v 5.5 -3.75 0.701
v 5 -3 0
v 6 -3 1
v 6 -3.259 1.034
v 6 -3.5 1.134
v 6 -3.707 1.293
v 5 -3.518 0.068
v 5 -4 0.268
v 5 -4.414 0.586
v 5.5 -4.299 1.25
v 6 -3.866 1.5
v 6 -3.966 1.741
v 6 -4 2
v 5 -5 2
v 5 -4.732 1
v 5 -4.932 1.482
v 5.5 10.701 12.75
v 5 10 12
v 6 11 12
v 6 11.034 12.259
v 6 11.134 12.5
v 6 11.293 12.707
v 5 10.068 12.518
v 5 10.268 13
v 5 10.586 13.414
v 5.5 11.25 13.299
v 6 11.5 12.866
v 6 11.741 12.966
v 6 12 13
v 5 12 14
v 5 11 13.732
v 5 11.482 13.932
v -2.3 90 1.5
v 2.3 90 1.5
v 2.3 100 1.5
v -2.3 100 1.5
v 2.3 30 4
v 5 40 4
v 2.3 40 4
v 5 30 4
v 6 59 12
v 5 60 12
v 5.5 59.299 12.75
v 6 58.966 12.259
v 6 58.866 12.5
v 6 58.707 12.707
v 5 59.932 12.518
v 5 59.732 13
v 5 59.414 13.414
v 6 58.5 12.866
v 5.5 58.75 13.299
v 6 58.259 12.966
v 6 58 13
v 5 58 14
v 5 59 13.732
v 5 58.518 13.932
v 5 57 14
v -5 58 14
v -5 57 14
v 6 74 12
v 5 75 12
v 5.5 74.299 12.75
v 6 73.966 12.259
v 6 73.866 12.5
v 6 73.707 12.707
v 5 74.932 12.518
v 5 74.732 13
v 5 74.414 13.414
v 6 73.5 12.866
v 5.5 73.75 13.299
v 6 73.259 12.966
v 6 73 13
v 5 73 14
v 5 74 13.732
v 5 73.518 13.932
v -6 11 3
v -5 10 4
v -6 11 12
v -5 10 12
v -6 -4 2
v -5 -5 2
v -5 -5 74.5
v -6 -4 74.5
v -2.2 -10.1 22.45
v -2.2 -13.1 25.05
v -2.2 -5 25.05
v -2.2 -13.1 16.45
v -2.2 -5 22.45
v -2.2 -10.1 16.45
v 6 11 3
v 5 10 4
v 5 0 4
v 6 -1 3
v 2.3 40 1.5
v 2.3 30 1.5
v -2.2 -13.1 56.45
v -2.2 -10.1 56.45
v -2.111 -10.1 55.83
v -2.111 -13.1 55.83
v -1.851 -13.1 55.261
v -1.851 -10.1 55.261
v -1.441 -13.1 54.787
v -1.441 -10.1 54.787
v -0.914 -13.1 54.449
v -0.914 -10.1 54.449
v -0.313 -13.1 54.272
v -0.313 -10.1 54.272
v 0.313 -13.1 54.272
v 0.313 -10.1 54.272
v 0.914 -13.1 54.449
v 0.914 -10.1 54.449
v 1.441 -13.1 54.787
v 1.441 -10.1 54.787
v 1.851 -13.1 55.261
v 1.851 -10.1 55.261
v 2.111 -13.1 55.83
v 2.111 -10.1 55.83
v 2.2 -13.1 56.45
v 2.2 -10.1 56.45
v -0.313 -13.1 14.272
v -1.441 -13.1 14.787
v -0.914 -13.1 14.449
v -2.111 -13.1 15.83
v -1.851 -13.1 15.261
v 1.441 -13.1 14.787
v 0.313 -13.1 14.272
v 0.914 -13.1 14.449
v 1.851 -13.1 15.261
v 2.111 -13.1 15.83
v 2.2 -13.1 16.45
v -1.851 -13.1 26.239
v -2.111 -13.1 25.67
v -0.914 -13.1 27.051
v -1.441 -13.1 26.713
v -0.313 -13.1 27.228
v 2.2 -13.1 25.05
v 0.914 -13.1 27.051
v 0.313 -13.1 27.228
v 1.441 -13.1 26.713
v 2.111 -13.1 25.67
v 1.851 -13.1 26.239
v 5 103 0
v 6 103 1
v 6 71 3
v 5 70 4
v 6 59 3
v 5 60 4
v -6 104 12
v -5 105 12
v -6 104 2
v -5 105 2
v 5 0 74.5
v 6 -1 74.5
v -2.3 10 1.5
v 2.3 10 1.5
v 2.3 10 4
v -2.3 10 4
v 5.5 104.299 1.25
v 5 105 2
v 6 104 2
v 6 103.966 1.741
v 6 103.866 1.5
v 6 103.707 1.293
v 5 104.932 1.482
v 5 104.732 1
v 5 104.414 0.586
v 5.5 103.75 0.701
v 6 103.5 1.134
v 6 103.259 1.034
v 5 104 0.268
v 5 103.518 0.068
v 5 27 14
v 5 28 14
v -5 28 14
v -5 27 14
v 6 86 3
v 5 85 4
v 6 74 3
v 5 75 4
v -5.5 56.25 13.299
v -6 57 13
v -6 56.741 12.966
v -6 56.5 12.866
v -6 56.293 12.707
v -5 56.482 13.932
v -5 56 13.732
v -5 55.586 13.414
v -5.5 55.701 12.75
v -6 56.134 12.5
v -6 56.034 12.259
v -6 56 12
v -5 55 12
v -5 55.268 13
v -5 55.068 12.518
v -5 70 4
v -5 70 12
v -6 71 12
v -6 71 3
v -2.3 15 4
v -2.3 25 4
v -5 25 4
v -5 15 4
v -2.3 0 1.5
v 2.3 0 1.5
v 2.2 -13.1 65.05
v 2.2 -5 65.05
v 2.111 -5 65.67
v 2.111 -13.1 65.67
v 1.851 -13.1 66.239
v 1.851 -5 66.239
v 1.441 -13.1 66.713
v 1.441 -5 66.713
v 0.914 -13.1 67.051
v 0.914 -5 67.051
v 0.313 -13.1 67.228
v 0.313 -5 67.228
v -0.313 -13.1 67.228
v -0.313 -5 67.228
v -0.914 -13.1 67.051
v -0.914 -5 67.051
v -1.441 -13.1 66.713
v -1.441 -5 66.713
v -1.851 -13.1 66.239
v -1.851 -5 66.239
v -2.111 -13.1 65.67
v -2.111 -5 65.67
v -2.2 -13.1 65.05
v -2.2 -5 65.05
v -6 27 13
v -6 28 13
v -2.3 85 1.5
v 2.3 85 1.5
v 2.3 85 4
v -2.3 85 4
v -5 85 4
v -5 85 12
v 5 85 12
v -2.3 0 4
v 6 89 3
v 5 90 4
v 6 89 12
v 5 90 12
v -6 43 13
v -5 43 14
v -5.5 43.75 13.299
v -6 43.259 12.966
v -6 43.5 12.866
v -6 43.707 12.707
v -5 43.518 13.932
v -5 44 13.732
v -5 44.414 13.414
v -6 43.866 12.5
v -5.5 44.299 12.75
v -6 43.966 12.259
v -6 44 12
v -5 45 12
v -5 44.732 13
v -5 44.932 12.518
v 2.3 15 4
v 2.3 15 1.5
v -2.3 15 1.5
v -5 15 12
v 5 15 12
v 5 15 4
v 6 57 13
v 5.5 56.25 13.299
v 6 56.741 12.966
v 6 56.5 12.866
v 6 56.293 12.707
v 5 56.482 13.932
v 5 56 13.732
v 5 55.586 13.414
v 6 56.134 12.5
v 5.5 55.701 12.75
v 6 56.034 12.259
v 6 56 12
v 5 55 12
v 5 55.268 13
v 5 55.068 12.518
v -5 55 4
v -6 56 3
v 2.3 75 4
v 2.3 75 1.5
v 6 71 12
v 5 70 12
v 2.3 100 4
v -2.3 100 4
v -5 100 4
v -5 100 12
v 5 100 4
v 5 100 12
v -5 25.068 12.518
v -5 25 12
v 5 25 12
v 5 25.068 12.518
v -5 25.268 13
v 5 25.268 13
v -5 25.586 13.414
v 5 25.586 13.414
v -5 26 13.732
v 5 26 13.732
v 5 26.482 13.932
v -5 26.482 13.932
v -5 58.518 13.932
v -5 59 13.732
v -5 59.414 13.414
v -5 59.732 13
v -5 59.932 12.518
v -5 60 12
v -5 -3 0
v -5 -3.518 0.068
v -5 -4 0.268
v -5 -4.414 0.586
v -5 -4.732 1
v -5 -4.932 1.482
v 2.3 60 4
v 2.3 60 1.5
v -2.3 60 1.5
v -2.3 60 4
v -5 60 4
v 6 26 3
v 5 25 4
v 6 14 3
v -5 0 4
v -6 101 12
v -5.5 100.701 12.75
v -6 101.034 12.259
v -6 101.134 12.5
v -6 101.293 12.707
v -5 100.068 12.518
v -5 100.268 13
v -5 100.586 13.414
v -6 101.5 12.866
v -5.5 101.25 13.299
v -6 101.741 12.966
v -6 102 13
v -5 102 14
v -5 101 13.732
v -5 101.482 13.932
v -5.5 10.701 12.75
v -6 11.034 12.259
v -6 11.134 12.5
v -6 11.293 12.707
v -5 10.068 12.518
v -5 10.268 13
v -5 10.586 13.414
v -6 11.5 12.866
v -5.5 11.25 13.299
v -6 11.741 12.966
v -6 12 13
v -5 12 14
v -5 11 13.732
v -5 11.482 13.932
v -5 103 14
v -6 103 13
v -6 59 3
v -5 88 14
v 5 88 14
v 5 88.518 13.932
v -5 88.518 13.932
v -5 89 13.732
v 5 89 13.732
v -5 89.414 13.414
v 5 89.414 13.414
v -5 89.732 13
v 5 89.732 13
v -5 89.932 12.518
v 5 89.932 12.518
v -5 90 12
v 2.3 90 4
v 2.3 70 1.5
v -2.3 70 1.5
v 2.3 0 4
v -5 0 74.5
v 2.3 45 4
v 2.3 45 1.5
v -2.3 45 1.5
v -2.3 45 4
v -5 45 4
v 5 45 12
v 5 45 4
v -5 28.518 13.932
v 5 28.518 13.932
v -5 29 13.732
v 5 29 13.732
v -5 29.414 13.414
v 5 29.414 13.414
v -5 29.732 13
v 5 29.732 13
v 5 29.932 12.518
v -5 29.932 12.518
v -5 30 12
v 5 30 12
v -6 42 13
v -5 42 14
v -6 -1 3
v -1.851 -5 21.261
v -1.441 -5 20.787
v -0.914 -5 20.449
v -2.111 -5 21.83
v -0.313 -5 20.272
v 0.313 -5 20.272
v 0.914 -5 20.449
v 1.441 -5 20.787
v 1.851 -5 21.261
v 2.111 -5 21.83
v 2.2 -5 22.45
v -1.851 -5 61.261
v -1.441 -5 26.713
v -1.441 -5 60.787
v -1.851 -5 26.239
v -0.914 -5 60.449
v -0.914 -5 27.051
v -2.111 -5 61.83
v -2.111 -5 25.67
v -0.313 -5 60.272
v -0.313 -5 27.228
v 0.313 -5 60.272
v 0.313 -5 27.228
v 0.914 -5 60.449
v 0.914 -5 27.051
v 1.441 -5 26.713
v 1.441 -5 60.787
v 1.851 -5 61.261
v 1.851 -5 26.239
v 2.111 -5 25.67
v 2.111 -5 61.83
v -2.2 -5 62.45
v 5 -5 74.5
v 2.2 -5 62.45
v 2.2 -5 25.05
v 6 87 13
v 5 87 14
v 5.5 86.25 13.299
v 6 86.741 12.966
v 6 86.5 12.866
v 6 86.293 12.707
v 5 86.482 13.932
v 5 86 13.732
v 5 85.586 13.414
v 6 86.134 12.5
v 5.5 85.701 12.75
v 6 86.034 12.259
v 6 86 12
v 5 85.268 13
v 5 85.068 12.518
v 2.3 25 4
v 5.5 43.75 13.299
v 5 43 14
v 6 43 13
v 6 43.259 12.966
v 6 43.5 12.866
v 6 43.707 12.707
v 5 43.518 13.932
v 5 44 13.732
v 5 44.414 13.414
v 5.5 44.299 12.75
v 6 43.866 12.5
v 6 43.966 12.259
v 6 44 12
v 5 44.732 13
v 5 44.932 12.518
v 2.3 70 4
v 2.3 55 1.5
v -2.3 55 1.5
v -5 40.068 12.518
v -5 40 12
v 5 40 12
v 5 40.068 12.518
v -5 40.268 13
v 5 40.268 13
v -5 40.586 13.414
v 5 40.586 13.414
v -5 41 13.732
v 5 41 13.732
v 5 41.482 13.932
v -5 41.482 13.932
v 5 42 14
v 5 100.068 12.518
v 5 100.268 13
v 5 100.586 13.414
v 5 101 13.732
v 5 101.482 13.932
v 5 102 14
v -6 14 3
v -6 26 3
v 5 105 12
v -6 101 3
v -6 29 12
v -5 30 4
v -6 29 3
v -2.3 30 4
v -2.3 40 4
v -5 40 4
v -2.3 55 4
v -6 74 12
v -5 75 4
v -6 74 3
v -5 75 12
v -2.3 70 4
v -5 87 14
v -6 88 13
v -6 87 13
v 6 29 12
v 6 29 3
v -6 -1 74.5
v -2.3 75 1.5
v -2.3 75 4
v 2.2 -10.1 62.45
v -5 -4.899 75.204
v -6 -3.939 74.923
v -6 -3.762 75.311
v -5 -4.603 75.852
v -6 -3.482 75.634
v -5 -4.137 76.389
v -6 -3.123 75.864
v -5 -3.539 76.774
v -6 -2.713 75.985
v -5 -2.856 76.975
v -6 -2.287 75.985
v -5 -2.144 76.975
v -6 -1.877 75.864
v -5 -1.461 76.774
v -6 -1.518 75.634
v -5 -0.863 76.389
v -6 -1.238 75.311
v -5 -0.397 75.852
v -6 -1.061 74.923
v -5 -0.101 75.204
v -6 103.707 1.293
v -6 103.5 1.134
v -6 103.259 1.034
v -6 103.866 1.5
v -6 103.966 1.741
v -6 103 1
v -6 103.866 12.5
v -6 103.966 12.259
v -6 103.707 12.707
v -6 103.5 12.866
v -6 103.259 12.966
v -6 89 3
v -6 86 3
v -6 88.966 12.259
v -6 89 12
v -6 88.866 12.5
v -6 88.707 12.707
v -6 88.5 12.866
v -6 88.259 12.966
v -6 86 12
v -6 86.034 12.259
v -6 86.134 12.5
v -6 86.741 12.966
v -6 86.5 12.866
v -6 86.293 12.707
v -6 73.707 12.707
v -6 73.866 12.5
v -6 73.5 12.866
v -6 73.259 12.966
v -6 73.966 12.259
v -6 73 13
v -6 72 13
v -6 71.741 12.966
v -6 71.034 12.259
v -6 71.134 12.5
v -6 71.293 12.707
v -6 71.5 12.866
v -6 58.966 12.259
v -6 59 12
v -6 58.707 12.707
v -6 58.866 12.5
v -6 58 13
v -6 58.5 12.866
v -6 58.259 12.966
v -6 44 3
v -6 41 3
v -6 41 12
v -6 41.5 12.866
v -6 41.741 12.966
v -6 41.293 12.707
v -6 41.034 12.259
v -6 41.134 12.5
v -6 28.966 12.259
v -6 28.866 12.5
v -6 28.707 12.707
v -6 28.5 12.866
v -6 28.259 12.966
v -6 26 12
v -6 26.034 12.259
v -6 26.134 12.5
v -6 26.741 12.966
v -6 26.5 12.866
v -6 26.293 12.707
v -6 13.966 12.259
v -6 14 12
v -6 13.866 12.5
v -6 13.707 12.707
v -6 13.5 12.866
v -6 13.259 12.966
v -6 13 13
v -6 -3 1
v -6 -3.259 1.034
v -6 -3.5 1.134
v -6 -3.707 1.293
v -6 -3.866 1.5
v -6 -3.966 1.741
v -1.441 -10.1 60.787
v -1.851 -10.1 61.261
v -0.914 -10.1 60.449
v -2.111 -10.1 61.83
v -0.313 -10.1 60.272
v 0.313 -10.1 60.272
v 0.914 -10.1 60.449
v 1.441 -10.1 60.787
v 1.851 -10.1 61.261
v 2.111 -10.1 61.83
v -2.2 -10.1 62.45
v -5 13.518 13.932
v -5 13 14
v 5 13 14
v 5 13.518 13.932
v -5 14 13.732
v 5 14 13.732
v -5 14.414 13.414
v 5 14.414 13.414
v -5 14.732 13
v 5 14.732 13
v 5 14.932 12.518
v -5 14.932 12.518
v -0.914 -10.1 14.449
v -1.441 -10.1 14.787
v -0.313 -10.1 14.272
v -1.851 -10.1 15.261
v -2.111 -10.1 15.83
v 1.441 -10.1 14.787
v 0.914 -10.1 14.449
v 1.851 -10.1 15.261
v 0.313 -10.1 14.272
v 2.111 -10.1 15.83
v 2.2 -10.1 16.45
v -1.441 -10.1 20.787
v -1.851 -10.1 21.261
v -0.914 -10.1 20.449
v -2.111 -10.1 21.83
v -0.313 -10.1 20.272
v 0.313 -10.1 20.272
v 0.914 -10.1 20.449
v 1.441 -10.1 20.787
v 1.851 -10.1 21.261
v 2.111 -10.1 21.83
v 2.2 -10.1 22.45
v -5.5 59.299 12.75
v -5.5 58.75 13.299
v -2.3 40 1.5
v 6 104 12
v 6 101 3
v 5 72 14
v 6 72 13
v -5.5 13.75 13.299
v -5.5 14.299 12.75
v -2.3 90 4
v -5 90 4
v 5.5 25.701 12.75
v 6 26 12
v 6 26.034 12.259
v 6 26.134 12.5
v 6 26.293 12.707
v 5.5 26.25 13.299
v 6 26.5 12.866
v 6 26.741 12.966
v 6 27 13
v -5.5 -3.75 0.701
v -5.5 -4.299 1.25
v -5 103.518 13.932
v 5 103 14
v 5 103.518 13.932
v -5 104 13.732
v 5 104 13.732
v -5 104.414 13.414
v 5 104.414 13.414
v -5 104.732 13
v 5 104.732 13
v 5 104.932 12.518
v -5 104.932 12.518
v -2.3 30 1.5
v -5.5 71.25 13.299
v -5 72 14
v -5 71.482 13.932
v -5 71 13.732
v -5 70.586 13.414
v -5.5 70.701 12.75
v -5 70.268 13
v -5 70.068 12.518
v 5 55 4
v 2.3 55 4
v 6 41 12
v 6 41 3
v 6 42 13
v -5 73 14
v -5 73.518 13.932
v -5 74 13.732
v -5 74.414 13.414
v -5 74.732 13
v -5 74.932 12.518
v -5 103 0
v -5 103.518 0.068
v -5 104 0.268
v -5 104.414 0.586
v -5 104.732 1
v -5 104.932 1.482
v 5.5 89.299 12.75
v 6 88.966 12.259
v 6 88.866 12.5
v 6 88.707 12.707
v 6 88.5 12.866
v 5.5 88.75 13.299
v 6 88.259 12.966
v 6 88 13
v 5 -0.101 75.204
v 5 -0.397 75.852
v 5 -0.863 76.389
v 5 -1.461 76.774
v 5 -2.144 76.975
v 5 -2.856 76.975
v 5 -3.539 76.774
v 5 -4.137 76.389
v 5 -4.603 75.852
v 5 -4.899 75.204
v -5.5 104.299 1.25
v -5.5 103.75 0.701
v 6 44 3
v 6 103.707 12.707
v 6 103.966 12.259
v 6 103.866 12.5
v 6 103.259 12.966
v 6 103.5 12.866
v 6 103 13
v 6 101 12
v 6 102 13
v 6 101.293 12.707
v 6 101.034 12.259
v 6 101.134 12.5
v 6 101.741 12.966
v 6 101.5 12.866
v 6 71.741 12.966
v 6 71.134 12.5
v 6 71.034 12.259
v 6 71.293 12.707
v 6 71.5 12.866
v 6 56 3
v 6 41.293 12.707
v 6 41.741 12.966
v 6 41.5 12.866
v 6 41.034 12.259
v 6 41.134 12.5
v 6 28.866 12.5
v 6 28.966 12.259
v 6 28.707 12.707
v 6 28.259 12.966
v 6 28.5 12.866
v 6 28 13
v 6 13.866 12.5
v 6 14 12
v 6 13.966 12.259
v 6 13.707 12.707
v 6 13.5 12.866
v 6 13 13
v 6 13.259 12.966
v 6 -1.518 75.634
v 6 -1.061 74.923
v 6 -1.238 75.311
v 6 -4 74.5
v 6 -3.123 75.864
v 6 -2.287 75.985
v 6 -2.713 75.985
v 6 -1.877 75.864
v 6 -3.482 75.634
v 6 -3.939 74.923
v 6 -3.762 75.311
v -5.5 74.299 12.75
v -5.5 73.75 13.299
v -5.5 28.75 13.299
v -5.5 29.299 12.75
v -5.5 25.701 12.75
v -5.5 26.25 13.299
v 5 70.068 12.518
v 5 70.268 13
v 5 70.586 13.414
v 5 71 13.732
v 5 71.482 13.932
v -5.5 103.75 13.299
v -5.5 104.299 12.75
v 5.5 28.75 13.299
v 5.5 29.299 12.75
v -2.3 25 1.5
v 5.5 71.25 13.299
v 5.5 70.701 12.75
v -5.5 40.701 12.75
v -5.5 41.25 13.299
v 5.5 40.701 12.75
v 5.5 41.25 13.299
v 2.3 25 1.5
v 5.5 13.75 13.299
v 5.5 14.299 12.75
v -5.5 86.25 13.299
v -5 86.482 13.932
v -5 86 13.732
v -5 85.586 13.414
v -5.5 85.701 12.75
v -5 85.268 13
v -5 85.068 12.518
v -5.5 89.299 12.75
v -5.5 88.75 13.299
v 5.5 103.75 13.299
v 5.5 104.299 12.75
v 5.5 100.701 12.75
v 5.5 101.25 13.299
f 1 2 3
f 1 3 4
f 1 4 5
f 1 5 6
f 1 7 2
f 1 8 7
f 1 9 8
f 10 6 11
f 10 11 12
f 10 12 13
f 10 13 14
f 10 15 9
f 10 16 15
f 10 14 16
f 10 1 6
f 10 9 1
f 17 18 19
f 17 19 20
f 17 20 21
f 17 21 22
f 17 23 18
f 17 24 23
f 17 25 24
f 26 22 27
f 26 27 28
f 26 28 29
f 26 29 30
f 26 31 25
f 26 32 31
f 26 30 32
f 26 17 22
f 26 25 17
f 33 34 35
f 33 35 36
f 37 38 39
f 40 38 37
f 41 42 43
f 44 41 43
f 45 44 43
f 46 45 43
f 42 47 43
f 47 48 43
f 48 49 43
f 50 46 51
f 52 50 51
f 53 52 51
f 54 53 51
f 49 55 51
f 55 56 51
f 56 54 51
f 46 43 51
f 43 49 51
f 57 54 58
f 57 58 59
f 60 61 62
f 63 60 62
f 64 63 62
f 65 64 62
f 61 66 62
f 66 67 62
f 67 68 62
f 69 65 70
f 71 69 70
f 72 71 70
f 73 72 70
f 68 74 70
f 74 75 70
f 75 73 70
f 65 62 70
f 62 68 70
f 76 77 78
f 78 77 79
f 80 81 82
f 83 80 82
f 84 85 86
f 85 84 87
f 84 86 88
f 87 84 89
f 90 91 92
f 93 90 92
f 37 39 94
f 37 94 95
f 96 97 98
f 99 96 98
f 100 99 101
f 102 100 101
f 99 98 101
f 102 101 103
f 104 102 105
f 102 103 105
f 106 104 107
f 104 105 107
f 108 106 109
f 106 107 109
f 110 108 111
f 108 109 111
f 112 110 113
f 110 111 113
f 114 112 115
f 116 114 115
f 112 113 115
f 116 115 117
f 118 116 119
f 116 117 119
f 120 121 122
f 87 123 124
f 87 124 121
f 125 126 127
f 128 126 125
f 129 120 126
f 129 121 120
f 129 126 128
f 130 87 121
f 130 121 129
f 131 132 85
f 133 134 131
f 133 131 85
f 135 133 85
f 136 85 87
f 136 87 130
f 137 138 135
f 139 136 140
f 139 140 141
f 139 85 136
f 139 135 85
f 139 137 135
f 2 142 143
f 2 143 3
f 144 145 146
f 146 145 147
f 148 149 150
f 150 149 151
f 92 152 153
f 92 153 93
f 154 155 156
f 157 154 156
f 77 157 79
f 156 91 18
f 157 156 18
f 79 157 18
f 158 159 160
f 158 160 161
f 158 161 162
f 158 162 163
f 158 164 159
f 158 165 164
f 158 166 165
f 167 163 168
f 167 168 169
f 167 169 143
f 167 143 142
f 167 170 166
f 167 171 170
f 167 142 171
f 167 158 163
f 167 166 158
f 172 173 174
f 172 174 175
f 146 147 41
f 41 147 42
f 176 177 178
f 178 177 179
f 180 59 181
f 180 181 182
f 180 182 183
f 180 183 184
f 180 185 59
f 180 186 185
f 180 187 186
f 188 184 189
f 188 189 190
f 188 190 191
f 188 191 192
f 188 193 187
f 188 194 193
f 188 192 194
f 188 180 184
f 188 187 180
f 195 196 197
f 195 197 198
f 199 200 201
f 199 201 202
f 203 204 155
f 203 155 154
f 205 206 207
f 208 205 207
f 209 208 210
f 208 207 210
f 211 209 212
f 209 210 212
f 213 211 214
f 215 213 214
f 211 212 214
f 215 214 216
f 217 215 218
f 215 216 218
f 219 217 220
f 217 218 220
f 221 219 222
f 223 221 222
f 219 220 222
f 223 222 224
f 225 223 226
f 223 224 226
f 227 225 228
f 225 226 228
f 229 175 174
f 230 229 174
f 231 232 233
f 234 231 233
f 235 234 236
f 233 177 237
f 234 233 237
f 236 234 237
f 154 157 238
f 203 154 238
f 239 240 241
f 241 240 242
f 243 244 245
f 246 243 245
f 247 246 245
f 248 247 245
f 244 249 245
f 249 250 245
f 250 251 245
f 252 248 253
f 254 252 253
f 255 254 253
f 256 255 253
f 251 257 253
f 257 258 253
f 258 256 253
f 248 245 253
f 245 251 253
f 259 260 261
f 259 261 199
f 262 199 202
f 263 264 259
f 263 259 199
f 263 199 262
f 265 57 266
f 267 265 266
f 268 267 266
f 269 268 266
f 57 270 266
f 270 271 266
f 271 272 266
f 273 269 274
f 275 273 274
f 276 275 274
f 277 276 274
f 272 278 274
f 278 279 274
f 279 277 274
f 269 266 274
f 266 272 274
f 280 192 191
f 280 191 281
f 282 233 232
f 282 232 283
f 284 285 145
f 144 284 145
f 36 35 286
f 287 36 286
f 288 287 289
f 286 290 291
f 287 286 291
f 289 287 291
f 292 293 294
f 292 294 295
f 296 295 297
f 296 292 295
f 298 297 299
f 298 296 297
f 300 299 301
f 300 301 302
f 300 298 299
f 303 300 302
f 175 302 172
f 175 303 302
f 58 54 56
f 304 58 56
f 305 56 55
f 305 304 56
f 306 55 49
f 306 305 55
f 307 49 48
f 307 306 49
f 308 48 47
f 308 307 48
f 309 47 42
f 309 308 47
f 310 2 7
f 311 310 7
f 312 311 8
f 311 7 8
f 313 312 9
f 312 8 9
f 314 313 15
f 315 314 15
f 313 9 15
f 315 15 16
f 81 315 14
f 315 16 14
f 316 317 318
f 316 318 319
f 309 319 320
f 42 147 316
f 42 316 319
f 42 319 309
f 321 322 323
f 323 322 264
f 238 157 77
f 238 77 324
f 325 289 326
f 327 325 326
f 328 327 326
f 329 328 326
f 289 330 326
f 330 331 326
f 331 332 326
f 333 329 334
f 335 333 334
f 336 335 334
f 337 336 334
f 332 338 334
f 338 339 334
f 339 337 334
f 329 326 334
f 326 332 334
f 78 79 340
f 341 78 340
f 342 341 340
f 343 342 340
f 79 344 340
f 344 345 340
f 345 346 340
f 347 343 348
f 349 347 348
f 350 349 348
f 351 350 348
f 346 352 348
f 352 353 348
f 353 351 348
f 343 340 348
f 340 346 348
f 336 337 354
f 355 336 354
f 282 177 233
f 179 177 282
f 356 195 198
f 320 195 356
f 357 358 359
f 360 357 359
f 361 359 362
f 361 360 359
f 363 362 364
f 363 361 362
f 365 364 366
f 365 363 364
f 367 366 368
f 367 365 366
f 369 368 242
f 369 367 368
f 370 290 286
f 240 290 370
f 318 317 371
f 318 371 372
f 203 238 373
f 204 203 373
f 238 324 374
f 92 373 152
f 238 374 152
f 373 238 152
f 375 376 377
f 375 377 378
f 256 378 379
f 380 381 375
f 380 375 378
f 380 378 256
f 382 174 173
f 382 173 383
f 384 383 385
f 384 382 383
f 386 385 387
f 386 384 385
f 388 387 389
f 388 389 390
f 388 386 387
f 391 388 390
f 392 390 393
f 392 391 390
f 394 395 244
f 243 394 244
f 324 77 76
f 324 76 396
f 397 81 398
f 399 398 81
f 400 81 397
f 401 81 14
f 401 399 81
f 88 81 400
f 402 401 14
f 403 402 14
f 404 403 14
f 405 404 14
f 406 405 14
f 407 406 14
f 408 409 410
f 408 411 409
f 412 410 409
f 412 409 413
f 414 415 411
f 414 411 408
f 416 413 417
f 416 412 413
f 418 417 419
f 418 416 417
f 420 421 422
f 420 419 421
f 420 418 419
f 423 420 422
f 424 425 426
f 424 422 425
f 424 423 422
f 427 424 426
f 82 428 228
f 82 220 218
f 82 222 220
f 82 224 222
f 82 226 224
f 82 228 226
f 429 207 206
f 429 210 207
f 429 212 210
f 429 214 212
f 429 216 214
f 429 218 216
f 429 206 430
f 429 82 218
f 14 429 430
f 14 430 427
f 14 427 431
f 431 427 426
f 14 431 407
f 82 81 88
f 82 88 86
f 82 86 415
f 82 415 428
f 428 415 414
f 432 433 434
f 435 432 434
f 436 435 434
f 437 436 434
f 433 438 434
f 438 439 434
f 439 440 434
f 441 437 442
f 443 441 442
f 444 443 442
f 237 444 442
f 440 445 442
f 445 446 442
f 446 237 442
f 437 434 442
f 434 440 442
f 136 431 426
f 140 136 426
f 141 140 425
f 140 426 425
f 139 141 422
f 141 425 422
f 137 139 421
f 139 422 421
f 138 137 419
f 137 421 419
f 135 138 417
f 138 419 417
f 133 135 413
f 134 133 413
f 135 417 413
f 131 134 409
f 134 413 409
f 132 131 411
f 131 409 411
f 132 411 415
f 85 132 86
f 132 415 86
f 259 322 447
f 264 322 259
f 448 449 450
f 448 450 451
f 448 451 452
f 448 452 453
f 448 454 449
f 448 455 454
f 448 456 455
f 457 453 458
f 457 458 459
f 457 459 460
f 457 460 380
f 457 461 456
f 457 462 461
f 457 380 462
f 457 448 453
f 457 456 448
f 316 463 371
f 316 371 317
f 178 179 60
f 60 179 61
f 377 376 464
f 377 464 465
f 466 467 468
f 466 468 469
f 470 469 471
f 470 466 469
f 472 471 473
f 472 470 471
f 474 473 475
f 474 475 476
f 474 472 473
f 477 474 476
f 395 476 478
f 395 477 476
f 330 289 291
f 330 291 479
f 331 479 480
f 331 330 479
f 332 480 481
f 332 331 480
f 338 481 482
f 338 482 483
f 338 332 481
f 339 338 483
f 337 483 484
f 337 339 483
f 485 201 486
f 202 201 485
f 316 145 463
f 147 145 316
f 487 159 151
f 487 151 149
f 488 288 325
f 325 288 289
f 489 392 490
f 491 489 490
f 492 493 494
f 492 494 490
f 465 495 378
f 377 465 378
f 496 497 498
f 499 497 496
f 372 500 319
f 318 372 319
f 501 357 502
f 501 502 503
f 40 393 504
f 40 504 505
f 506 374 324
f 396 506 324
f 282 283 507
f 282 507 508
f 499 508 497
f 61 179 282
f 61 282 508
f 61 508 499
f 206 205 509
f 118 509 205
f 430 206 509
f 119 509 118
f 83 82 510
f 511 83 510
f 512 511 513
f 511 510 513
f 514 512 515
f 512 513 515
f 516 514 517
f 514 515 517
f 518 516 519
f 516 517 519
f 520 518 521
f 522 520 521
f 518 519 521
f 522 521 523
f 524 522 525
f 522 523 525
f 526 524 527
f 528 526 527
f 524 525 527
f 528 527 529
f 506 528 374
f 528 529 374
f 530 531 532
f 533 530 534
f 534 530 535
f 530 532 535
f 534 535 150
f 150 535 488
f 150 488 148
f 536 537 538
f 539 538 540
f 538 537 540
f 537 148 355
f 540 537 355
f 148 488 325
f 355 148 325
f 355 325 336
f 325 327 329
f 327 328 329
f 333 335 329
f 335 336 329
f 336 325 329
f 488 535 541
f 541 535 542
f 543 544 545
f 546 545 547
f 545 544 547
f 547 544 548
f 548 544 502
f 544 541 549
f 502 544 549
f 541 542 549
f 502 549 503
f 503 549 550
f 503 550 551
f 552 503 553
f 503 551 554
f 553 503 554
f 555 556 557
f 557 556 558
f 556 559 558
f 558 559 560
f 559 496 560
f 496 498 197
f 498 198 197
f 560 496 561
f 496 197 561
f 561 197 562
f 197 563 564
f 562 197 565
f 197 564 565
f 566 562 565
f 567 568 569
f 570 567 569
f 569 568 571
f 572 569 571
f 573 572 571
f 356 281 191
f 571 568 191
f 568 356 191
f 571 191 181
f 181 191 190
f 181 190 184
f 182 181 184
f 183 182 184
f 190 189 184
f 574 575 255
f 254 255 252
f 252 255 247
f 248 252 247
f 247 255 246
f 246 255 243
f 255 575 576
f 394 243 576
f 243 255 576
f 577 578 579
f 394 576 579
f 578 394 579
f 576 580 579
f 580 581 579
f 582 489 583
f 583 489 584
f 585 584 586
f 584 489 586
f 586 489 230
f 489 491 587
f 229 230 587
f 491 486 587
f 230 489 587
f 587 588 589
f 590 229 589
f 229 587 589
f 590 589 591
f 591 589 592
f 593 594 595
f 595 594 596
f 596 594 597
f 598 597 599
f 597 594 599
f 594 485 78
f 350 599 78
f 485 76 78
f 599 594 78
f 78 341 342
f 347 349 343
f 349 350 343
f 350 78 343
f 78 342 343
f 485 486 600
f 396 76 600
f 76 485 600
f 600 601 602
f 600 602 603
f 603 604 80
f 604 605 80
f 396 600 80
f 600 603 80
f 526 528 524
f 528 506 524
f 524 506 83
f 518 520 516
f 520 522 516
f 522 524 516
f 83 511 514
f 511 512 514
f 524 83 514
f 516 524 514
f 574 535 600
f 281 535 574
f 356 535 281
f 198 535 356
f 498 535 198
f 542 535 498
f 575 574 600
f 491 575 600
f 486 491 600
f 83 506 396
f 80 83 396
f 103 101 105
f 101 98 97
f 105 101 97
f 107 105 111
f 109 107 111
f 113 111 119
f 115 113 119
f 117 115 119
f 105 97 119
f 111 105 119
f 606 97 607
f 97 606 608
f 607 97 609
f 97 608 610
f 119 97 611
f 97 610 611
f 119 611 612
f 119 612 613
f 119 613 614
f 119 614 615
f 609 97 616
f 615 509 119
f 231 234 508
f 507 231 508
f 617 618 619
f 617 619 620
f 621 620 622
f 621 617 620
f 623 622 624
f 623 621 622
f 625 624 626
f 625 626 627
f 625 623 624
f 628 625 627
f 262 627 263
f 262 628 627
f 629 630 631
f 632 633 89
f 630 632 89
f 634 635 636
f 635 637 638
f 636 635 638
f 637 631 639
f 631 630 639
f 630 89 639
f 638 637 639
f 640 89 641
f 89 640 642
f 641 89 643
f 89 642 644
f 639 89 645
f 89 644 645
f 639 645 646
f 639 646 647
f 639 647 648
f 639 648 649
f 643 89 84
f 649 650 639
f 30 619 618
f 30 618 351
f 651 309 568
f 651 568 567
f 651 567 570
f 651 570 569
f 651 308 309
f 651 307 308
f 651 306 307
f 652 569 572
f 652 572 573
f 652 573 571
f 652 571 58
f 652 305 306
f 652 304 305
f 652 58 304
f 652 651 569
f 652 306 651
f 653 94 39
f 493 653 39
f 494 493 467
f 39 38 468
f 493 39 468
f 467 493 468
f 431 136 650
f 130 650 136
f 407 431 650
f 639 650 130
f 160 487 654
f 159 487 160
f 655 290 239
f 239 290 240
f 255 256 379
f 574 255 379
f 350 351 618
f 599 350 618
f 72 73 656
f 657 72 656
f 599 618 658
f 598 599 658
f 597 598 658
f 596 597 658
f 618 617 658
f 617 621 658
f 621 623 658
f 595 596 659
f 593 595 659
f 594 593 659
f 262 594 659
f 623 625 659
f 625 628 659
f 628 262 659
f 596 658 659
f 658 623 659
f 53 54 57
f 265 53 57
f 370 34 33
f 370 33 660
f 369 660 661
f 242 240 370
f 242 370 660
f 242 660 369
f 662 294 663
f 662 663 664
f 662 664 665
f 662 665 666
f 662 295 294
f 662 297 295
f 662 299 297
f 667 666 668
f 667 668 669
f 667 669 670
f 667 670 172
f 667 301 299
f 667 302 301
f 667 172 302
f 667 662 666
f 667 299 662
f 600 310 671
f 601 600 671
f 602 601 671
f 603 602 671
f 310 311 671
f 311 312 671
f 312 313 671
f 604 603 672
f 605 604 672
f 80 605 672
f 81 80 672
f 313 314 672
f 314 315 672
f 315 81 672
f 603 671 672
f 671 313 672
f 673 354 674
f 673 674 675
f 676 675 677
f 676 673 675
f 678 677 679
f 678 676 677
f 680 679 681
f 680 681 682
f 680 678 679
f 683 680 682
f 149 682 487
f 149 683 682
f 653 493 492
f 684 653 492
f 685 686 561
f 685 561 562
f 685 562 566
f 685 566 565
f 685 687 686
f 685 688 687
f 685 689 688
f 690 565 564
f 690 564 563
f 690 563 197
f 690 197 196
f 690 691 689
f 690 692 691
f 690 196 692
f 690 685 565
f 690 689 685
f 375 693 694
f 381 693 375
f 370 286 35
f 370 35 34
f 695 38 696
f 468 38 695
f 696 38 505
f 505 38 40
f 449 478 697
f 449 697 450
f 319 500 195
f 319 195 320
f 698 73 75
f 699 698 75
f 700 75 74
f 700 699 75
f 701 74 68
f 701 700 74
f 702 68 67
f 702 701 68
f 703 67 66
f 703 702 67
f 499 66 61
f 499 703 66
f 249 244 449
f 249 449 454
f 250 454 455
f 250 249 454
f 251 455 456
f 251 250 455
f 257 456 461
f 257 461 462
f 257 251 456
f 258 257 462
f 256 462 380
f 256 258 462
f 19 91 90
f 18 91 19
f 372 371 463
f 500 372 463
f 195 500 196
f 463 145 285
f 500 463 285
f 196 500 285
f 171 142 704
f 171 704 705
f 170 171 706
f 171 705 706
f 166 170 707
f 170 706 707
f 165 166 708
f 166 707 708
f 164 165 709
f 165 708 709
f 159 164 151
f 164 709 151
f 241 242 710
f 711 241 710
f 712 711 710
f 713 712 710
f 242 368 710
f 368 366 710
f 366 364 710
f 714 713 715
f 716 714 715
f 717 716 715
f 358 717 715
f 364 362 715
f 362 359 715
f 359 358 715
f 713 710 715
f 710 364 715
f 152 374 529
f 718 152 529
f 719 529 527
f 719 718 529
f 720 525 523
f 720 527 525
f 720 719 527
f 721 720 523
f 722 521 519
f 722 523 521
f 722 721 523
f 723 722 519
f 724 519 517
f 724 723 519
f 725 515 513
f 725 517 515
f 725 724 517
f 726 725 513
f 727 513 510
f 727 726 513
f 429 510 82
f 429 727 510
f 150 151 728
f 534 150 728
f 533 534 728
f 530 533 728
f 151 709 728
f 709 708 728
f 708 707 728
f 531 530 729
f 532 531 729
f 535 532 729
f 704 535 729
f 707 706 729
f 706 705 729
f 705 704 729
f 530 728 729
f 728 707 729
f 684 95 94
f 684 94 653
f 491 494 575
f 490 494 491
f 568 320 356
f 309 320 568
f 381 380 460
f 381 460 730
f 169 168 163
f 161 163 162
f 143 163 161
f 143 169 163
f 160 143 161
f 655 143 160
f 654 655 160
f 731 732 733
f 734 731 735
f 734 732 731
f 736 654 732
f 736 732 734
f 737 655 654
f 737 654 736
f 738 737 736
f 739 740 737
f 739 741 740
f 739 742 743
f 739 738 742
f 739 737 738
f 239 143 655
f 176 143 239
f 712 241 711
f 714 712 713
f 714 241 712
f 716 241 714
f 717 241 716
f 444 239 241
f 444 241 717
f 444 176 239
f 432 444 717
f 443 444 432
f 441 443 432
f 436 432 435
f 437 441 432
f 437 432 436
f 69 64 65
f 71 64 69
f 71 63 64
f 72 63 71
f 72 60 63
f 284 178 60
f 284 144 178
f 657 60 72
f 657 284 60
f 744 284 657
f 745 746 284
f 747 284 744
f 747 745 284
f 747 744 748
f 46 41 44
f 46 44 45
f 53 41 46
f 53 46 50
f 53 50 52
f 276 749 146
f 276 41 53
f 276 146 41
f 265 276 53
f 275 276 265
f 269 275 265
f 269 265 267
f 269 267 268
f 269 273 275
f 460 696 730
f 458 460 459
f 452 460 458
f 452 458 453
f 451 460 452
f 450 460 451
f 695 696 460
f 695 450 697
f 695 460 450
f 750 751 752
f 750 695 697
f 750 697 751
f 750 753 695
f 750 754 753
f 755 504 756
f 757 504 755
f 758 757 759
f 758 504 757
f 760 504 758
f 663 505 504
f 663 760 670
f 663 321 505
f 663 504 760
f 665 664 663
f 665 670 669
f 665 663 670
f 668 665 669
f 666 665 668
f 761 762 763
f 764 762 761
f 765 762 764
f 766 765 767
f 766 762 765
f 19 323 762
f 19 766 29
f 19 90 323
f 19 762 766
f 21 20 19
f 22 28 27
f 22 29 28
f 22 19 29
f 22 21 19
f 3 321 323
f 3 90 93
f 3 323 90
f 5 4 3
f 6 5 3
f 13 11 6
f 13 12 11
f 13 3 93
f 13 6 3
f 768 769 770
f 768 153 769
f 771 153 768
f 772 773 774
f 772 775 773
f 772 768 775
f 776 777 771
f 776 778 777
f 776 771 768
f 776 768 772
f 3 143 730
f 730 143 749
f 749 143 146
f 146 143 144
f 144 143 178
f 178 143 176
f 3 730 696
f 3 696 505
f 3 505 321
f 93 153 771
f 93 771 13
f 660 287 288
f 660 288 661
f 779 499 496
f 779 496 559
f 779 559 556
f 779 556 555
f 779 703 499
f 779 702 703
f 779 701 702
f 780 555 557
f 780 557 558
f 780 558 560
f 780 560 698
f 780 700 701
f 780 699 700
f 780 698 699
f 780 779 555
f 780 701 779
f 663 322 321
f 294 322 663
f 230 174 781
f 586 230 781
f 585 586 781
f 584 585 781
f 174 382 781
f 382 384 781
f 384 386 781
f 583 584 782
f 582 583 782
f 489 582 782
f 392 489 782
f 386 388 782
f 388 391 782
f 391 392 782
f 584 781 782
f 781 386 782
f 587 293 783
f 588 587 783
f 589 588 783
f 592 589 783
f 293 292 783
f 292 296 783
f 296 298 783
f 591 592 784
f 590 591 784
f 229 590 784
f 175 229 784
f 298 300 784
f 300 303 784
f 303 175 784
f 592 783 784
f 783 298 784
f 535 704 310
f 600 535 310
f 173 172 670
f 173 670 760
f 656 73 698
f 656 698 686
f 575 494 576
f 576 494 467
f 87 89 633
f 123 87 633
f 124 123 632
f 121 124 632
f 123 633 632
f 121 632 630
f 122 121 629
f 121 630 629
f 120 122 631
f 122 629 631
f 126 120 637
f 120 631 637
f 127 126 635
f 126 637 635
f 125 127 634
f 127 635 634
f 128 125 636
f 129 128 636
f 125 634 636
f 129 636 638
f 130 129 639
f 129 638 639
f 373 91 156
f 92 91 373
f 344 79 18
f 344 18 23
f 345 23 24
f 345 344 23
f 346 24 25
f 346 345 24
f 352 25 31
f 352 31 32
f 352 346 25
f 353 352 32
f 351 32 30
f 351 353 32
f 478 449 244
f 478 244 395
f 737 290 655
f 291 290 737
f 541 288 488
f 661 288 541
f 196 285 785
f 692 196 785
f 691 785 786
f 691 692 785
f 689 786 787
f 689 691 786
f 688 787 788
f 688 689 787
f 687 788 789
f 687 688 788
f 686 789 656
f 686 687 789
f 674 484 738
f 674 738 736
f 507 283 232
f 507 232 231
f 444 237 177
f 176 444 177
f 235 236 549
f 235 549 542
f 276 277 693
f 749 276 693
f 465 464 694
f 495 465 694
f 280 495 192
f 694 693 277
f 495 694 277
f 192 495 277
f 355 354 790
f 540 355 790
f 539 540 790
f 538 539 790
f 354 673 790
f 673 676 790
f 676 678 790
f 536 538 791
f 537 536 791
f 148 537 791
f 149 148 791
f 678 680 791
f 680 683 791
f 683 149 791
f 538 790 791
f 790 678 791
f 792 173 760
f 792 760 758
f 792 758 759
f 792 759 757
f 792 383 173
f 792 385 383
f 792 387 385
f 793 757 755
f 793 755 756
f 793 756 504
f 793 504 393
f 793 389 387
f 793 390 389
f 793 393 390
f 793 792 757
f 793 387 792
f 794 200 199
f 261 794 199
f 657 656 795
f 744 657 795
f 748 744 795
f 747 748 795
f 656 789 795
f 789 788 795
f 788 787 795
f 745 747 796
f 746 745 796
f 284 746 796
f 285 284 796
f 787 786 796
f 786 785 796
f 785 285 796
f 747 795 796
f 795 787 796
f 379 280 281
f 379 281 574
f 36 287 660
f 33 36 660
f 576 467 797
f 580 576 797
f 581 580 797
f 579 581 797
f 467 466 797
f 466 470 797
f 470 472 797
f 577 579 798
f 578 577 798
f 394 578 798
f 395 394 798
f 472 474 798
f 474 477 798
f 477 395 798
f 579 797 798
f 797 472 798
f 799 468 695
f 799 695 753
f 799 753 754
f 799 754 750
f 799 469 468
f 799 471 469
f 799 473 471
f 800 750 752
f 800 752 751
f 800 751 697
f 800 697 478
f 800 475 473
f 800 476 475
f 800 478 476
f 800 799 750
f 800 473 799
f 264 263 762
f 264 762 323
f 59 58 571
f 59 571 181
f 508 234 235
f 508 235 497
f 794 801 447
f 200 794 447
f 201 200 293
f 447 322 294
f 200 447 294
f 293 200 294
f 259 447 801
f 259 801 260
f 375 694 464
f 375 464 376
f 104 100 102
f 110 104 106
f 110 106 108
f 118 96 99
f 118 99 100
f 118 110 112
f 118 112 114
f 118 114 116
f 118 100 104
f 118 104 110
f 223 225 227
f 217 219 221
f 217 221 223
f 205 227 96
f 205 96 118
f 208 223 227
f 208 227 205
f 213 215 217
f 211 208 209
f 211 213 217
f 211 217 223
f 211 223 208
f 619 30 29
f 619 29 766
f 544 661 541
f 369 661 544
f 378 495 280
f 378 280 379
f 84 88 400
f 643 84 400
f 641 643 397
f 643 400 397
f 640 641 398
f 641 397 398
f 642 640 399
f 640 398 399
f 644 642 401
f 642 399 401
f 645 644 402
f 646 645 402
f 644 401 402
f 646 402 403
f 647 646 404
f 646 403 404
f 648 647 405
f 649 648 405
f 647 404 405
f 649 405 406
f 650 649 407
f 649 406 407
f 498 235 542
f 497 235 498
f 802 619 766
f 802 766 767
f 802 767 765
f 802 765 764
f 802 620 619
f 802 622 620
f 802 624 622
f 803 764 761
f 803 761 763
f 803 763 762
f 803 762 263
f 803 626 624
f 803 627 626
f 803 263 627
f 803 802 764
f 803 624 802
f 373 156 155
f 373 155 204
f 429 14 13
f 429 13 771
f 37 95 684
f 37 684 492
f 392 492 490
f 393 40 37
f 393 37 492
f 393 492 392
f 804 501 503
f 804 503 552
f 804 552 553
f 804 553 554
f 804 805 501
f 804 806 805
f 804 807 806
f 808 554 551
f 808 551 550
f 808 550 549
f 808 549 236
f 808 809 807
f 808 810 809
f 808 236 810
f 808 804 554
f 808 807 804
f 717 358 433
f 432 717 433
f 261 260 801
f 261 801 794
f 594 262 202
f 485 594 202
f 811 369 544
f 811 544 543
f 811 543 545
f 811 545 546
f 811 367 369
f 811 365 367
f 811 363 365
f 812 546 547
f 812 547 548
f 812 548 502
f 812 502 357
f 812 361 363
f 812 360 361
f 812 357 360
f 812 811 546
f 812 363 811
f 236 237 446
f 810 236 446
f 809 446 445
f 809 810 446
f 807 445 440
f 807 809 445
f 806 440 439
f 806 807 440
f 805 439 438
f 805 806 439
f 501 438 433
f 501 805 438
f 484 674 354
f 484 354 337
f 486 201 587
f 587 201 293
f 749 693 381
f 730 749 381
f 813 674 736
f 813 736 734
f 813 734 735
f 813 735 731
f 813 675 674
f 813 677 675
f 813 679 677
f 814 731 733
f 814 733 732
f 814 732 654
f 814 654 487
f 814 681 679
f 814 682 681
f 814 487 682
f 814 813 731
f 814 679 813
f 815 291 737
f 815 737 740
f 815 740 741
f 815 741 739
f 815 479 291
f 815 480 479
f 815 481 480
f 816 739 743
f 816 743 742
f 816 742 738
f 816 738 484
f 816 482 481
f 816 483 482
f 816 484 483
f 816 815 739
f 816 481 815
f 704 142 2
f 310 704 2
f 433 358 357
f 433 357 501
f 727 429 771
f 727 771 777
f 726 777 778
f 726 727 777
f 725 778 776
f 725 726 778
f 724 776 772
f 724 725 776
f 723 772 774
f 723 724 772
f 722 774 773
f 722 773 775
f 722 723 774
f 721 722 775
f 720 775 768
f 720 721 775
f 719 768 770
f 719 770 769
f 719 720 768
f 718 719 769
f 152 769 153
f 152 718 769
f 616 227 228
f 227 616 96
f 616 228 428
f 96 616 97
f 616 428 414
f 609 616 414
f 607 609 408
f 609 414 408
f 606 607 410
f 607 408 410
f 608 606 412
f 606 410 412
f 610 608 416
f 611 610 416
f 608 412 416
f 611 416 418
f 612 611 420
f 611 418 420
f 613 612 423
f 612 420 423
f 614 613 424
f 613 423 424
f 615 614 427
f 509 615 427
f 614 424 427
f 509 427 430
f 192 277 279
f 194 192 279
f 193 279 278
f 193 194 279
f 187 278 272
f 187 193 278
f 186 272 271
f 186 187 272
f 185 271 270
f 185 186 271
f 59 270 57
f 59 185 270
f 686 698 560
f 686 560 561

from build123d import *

# Parameters (mm, degrees)
SKETCH_W        = 12
SKETCH_H        = 77
PAD_DEPTH       = 5
PAD001_DEPTH    = 5.1
PAD002_DEPTH    = 3
SKETCH003_W     = 4
SKETCH003_H     = 105
SKETCH003_W_2   = 10
SKETCH003_H_2   = 5
PAD003_DEPTH    = 12
SKETCH004_W     = 4.6
SKETCH004_H     = 10
POCKET_DEPTH    = 2.5
POCKET001_DEPTH = 12.001
FILLET_R        = 2
CHAMFER_SIZE    = 1


with BuildPart() as part:
    # Sketch → Pad (new body)
    with BuildSketch(Plane.XZ):
        with Locations((0, 38.5)):
            Rectangle(SKETCH_W, SKETCH_H)
    extrude(amount=PAD_DEPTH)

    # Sketch001 (on Face6 of Pad) → Pad001 (join)
    with BuildSketch(Plane.XZ.offset(5)):
        with BuildLine():
            Line((-2.2, 25.05), (-2.2, 22.45))
            ThreePointArc((-2.2, 22.45), (0, 20.25), (2.2, 22.45))
            Line((2.2, 25.05), (2.2, 22.45))
            ThreePointArc((2.2, 25.05), (0, 27.25), (-2.2, 25.05))
        make_face()
        with BuildLine():
            Line((-2.2, 65.05), (-2.2, 62.45))
            ThreePointArc((-2.2, 62.45), (0, 60.25), (2.2, 62.45))
            Line((2.2, 65.05), (2.2, 62.45))
            ThreePointArc((2.2, 65.05), (0, 67.25), (-2.2, 65.05))
        make_face()
    extrude(amount=PAD001_DEPTH)

    # Sketch002 (on Face16 of Pad001) → Pad002 (join)
    with BuildSketch(Plane.XZ.offset(10.1)):
        with BuildLine():
            Line((-2.2, 25.05), (-2.2, 16.45))
            ThreePointArc((-2.2, 16.45), (0, 14.25), (2.2, 16.45))
            Line((2.2, 25.05), (2.2, 16.45))
            ThreePointArc((2.2, 25.05), (0, 27.25), (-2.2, 25.05))
        make_face()
        with BuildLine():
            Line((-2.2, 65.05), (-2.2, 56.45))
            ThreePointArc((-2.2, 56.45), (0, 54.25), (2.2, 56.45))
            Line((2.2, 65.05), (2.2, 56.45))
            ThreePointArc((2.2, 65.05), (0, 67.25), (-2.2, 65.05))
        make_face()
    extrude(amount=PAD002_DEPTH)

    # Sketch003 (on Face6 of Pad002) → Pad003 (join)
    with BuildSketch(Plane(origin=(6, 0, 0), x_dir=(0, 0, 1), z_dir=(1, 0, 0))):
        with Locations((2, -52.5)):
            Rectangle(SKETCH003_W, SKETCH003_H)
        with Locations((9, -12.5)):
            Rectangle(SKETCH003_W_2, SKETCH003_H_2)
        with Locations((9, -27.5)):
            Rectangle(SKETCH003_W_2, SKETCH003_H_2)
        with Locations((9, -42.5)):
            Rectangle(SKETCH003_W_2, SKETCH003_H_2)
        with Locations((9, -57.5)):
            Rectangle(SKETCH003_W_2, SKETCH003_H_2)
        with Locations((9, -72.5)):
            Rectangle(SKETCH003_W_2, SKETCH003_H_2)
        with Locations((9, -87.5)):
            Rectangle(SKETCH003_W_2, SKETCH003_H_2)
        with Locations((9, -102.5)):
            Rectangle(SKETCH003_W_2, SKETCH003_H_2)
    extrude(amount=-PAD003_DEPTH)

    # Sketch004 (on Face30 of Pad003) → Pocket (cut)
    with BuildSketch(Plane(origin=(0, 0, 4), x_dir=(-1, 0, 0), z_dir=(0, 0, 1))):
        with Locations((0, -5)):
            Rectangle(SKETCH004_W, SKETCH004_H)
        with Locations((0, -20)):
            Rectangle(SKETCH004_W, SKETCH004_H)
        with Locations((0, -35)):
            Rectangle(SKETCH004_W, SKETCH004_H)
        with Locations((0, -50)):
            Rectangle(SKETCH004_W, SKETCH004_H)
        with Locations((0, -65)):
            Rectangle(SKETCH004_W, SKETCH004_H)
        with Locations((0, -80)):
            Rectangle(SKETCH004_W, SKETCH004_H)
        with Locations((0, -95)):
            Rectangle(SKETCH004_W, SKETCH004_H)
    extrude(amount=-POCKET_DEPTH, mode=Mode.SUBTRACT)

    # Sketch005 (on Face5 of Pocket) → Pocket001 (cut, through all)
    with BuildSketch(Plane(origin=(6, 0, 0), x_dir=(0, 0, 1), z_dir=(1, 0, 0))):
        with BuildLine():
            ThreePointArc((74.499999, 0), (77, 2.5), (74.5, 5))
            Line((74.5, 5), (77.1, 5))
            Line((77.1, 5), (77.099999, 0))
            Line((74.499999, 0), (77.099999, 0))
        make_face()
    extrude(amount=-POCKET001_DEPTH, mode=Mode.SUBTRACT)

    # Fillet
    fillet_edges = [part.edges().sort_by_distance(p)[0] for p in [
        (0, 105, 0),
        (0, -5, 0),
        (0, 105, 14),
        (0, 100, 14),
        (0, 90, 14),
        (0, 85, 14),
        (0, 75, 14),
        (0, 70, 14),
        (0, 60, 14),
        (0, 55, 14),
        (0, 45, 14),
        (0, 40, 14),
        (0, 30, 14),
        (0, 25, 14),
        (0, 15, 14),
        (0, 10, 14),
    ]]
    fillet(fillet_edges, radius=FILLET_R)

    # Chamfer
    chamfer_edges = [part.edges().sort_by_distance(p)[0] for p in [
        (6, -5, 38.25),
        (6, -4.414214, 0.585786),
        (6, -4.267767, 76.267767),
        (6, 50, 0),
        (6, -0.732233, 76.267767),
        (6, 104.414214, 0.585786),
        (6, 0, 39.25),
        (6, 105, 7),
        (6, 5, 4),
        (6, 104.414214, 13.414214),
        (6, 10, 8),
        (6, 102.5, 14),
        (6, 10.585786, 13.414214),
        (6, 100.585786, 13.414214),
        (6, 12.5, 14),
        (6, 100, 8),
        (6, 14.414214, 13.414214),
        (6, 95, 4),
        (6, 15, 8),
        (6, 90, 8),
        (6, 20, 4),
        (6, 89.414214, 13.414214),
        (6, 25, 8),
        (6, 87.5, 14),
        (6, 25.585786, 13.414214),
        (6, 85.585786, 13.414214),
        (6, 27.5, 14),
        (6, 85, 8),
        (6, 29.414214, 13.414214),
        (6, 80, 4),
        (6, 30, 8),
        (6, 75, 8),
        (6, 35, 4),
        (6, 74.414214, 13.414214),
        (6, 40, 8),
        (6, 72.5, 14),
        (6, 40.585786, 13.414214),
        (6, 70.585786, 13.414214),
        (6, 42.5, 14),
        (6, 70, 8),
        (6, 44.414214, 13.414214),
        (6, 65, 4),
        (6, 45, 8),
        (6, 60, 8),
        (6, 50, 4),
        (6, 59.414214, 13.414214),
        (6, 55, 8),
        (6, 57.5, 14),
        (6, 55.585786, 13.414214),
        (-6, -5, 38.25),
        (-6, -4.414214, 0.585786),
        (-6, -4.267767, 76.267767),
        (-6, 50, 0),
        (-6, -0.732233, 76.267767),
        (-6, 104.414214, 0.585786),
        (-6, 0, 39.25),
        (-6, 105, 7),
        (-6, 5, 4),
        (-6, 104.414214, 13.414214),
        (-6, 10, 8),
        (-6, 102.5, 14),
        (-6, 10.585786, 13.414214),
        (-6, 100.585786, 13.414214),
        (-6, 12.5, 14),
        (-6, 100, 8),
        (-6, 14.414214, 13.414214),
        (-6, 95, 4),
        (-6, 15, 8),
        (-6, 90, 8),
        (-6, 20, 4),
        (-6, 89.414214, 13.414214),
        (-6, 25, 8),
        (-6, 87.5, 14),
        (-6, 25.585786, 13.414214),
        (-6, 85.585786, 13.414214),
        (-6, 27.5, 14),
        (-6, 85, 8),
        (-6, 29.414214, 13.414214),
        (-6, 80, 4),
        (-6, 30, 8),
        (-6, 75, 8),
        (-6, 35, 4),
        (-6, 74.414214, 13.414214),
        (-6, 40, 8),
        (-6, 72.5, 14),
        (-6, 40.585786, 13.414214),
        (-6, 70.585786, 13.414214),
        (-6, 42.5, 14),
        (-6, 70, 8),
        (-6, 44.414214, 13.414214),
        (-6, 65, 4),
        (-6, 45, 8),
        (-6, 60, 8),
        (-6, 50, 4),
        (-6, 59.414214, 13.414214),
        (-6, 55, 8),
        (-6, 57.5, 14),
        (-6, 55.585786, 13.414214),
    ]]
    chamfer(chamfer_edges, length=CHAMFER_SIZE)


solid = part.part
